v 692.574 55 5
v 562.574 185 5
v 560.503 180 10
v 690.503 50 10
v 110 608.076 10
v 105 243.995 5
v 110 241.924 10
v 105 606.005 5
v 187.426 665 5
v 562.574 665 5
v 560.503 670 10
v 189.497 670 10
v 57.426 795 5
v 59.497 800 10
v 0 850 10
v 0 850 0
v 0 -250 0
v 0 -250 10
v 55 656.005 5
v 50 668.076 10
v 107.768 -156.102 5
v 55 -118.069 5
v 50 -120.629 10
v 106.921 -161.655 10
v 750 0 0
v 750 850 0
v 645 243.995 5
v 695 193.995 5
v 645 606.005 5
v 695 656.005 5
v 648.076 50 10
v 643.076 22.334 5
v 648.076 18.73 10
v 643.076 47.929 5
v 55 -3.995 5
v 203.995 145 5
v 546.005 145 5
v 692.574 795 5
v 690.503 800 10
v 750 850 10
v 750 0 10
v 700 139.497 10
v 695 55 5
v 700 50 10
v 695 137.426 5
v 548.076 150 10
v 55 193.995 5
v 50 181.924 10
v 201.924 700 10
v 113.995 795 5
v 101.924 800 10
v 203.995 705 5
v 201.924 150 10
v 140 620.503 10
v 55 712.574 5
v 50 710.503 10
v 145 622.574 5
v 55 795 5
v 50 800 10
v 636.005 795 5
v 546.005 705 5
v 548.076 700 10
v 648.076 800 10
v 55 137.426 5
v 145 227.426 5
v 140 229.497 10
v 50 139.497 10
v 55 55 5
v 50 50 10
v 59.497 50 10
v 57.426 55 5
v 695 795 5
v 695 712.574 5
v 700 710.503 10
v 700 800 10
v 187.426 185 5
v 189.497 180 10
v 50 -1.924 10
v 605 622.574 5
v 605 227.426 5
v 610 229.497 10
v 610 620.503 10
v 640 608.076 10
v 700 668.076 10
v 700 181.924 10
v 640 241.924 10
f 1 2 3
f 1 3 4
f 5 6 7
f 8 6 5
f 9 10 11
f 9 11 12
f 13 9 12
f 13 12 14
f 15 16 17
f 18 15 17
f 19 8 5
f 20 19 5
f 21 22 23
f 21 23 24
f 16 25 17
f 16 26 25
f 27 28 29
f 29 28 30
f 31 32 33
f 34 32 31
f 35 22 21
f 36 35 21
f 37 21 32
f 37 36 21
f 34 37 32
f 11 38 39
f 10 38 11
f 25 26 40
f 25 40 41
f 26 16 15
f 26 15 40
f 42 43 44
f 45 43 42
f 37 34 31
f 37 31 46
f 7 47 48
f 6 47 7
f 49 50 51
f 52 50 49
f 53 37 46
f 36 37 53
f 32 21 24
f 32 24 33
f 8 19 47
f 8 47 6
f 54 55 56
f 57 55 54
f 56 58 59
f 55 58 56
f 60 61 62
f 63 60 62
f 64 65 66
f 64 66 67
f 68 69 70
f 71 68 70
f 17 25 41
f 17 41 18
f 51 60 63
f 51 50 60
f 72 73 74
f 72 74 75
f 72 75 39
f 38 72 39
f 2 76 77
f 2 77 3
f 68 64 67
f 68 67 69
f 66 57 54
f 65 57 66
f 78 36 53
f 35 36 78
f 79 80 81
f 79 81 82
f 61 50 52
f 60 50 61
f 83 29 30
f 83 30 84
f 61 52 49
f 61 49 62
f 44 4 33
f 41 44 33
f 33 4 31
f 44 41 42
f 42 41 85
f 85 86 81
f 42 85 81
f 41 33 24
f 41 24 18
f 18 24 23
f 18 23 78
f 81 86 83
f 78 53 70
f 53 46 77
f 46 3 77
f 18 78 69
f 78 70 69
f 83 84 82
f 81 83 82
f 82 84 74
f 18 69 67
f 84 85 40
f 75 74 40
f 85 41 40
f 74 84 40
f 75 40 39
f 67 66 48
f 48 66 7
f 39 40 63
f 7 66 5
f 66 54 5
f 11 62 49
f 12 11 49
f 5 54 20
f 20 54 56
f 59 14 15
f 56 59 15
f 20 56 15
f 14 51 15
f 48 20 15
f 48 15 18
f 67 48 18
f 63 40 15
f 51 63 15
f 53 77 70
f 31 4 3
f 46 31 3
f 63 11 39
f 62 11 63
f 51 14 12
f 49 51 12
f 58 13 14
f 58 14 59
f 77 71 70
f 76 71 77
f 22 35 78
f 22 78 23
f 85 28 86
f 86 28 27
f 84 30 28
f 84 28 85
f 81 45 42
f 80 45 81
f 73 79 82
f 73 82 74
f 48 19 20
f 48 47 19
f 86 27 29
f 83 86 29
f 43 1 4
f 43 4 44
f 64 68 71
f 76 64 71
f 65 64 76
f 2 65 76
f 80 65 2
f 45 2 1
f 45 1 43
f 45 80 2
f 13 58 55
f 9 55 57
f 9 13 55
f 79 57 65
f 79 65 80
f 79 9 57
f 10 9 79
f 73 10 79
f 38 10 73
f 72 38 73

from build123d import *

# Parameters (mm, degrees)
BOSS_EXTRU_1_DEPTH      = 10
ENL_V_MAT_EXTRU_1_DEPTH = 5
CHANFREIN1_SIZE         = 5


with BuildPart() as part:
    # Esquisse1 → Boss.-Extru.1 (new body)
    with BuildSketch(Plane.XY):
        Polygon((750, 0), (0, -250), (0, 0), (0, 850), (750, 850), align=None)
    extrude(amount=BOSS_EXTRU_1_DEPTH)

    # Esquisse2 → Enlèv. mat.-Extru.1 (cut)
    with BuildSketch(Plane.XY.offset(10)):
        Polygon((110, 241.923881554), (110, 608.076118446), (50, 668.076118446), (50, 181.923881554), align=None)
        Polygon((201.923881554, 700), (548.076118446, 700), (648.076118446, 800), (101.923881554, 800), align=None)
        Polygon((50, 800), (50, 710.502525317), (140, 620.502525317), (140, 229.497474683), (50, 139.497474683), (50, 50), (59.497474683, 50), (189.497474683, 180), (560.502525317, 180), (690.502525317, 50), (700, 50), (700, 139.497474683), (610, 229.497474683), (610, 620.502525317), (700, 710.502525317), (700, 800), (690.502525317, 800), (560.502525317, 670), (189.497474683, 670), (59.497474683, 800), align=None)
        Polygon((700, 668.076118446), (700, 181.923881554), (640, 241.923881554), (640, 608.076118446), align=None)
        Polygon((648.076118446, 50), (548.076118446, 150), (201.923881554, 150), (101.923881554, 50), (50, -1.923881554), (50, -120.628705664), (106.920997883, -161.655039703), (648.076118446, 18.730000485), align=None)
    extrude(amount=-ENL_V_MAT_EXTRU_1_DEPTH, mode=Mode.SUBTRACT)

    # Chanfrein1
    chanfrein1_edges = [part.edges().sort_by_distance(p)[0] for p in [
        (50, 425, 5),
        (80, 638.076118446, 5),
        (124.497474683, 735, 5),
        (375, 670, 5),
        (140, 425, 5),
        (95, 665.502525317, 5),
        (50, 755.251262658, 5),
        (54.748737342, 800, 5),
        (375, 800, 5),
        (375, 700, 5),
        (151.923881554, 750, 5),
        (110, 425, 5),
        (80, 211.923881554, 5),
        (625.502525317, 735, 5),
        (695.251262658, 800, 5),
        (700, 755.251262658, 5),
        (655, 665.502525317, 5),
        (610, 425, 5),
        (655, 184.497474683, 5),
        (700, 94.748737342, 5),
        (695.251262658, 50, 5),
        (625.502525317, 115, 5),
        (375, 180, 5),
        (124.497474683, 115, 5),
        (54.748737342, 50, 5),
        (50, 94.748737342, 5),
        (95, 184.497474683, 5),
        (598.076118446, 750, 5),
        (700, 425, 5),
        (670, 211.923881554, 5),
        (640, 425, 5),
        (670, 638.076118446, 5),
        (375, 150, 5),
        (598.076118446, 100, 5),
        (648.076118446, 34.365000242, 5),
        (377.498558164, -71.462519609, 5),
        (78.460498942, -141.141872683, 5),
        (50, -61.276293609, 5),
        (125.961940777, 74.038059223, 5),
    ]]
    chamfer(chanfrein1_edges, length=CHANFREIN1_SIZE - 0.0001)  # a hair under: the kernel refuses the full size


solid = part.part
